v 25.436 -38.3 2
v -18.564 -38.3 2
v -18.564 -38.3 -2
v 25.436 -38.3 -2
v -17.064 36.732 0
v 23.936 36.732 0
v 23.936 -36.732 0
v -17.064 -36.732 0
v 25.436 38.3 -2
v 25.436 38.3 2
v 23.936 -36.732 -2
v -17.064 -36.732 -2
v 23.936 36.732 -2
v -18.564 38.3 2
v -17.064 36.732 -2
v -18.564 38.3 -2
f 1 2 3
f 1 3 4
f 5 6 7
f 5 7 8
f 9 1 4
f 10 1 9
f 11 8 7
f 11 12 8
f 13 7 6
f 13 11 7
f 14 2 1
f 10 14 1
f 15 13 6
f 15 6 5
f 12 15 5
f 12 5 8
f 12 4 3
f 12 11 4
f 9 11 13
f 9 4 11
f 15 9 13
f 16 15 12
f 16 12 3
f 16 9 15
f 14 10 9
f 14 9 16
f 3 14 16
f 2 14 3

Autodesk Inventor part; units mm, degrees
ref_plane "YZ Plane" through (0, 0, 0) normal (1, 0, 0) x (0, 1, 0)
ref_plane "XZ Plane" through (0, 0, 0) normal (0, 1, 0) x (-1, 0, 0)
ref_plane "XY Plane" through (0, 0, 0) normal (0, 0, 1) x (1, 0, 0)
sketch "Esquisse1" plane through (0, 0, 0) normal (0, 0, 1) x (1, 0, 0)
  line L0 (-1, -22.45) -> (1, -22.45) projected
  line L1 (-1, -21.45) -> (-1, -22.45) projected
  line L2 (-3, -21.45) -> (-1, -21.45) projected
  line L3 (-3, -21.45) -> (-3, -34.3) projected
  line L4 (-3, -34.3) -> (-13.5643, -34.3) projected
  line L5 (-13.5643, -34.3) -> (-13.5643, 34.3) projected
  line L6 (-13.5643, 34.3) -> (-3, 34.3) projected
  line L7 (-3, 21.45) -> (-3, 34.3) projected
  line L8 (-1, 21.45) -> (-3, 21.45) projected
  line L9 (-1, 22.45) -> (-1, 21.45) projected
  line L10 (1, 22.45) -> (-1, 22.45) projected
  line L11 (1, 21.45) -> (1, 22.45) projected
  line L12 (3, 21.45) -> (1, 21.45) projected
  line L13 (3, 24.45) -> (3, 21.45) projected
  line L14 (3, 24.45) -> (3.0074, 24.45) projected
  line L15 (3.0074, 24.45) -> (3.0074, 34.3) projected
  line L16 (3.0074, 34.3) -> (15.5357, 34.3) projected
  line L17 (15.5357, 34.3) -> (15.5357, 30.7219) projected
  line L18 (15.5357, 30.7219) -> (17.5357, 30.7219) projected
  line L19 (17.5357, 30.7219) -> (17.5357, 34.3) projected
  line L20 (17.5357, 34.3) -> (21.4357, 34.3) projected
  line L21 (21.4357, 34.3) -> (21.4357, 30.7219) projected
  line L22 (21.4357, 30.7219) -> (23.4357, 30.7219) projected
  line L23 (23.4357, 30.7219) -> (23.4357, 36.3) projected
  line L24 (-16.5643, 36.3) -> (23.4357, 36.3) projected
  line L25 (-16.5643, 36.3) -> (-16.5643, -36.3) projected
  line L26 (-16.5643, -36.3) -> (23.4357, -36.3) projected
  line L27 (23.4357, -30.7219) -> (23.4357, -36.3) projected
  line L28 (23.4357, -30.7219) -> (21.4357, -30.7219) projected
  line L29 (21.4357, -30.7219) -> (21.4357, -34.3) projected
  line L30 (21.4357, -34.3) -> (17.5357, -34.3) projected
  line L31 (17.5357, -34.3) -> (17.5357, -30.7219) projected
  line L32 (17.5357, -30.7219) -> (15.5357, -30.7219) projected
  line L33 (15.5357, -30.7219) -> (15.5357, -34.3) projected
  line L34 (15.5357, -34.3) -> (3.0074, -34.3) projected
  line L35 (3.0074, -34.3) -> (3.0074, -24.45) projected
  line L36 (3.0074, -24.45) -> (3, -24.45) projected
  line L37 (3, -21.45) -> (3, -24.45) projected
  line L38 (1, -21.45) -> (3, -21.45) projected
  line L39 (1, -22.45) -> (1, -21.45) projected
  line L40 (23.4357, 36.3) -> (-16.5643, 36.3)
  line L41 (-16.5643, 36.3) -> (-16.5643, -36.3)
  line L42 (-16.5643, -36.3) -> (23.4357, -36.3)
  line L43 (23.4357, -36.3) -> (23.4357, 36.3)
  line L44 (-18.5643, 38.3) -> (25.4357, 38.3)
  line L45 (25.4357, 38.3) -> (25.4357, -38.3)
  line L46 (25.4357, -38.3) -> (-18.5643, -38.3)
  line L47 (-18.5643, -38.3) -> (-18.5643, 38.3)
  point P0 (0, 0)
  dimension "d0" = 2
extrude "Extrusion1" add sketch "Esquisse1" along normal blind 2 contours L1 L2 L3 L4 L5 L6 L7 L8 L9 L10 L11 L12 L13 L14 L15 L16 L17 L18 L19 L20 L21 L22 L43 L28 L29 L30 L31 L32 L33 L34 L35 L36 L37 L38 L39 L0 | L0 L39 L38 L37 L36 L35 L34 L33 L32 L31 L30 L29 L28 L27 L26 L25 L24 L23 L22 L21 L20 L19 L18 L17 L16 L15 L14 L13 L12 L11 L10 L9 L8 L7 L6 L5 L4 L3 L2 L1 | L44 L45 L46 L47
sketch "Esquisse2" plane through (0, 0, 0) normal (0, 0, -1) x (-1, 0, 0)
  line L0 (-23.4357, -36.3) -> (-23.4357, 36.3) projected
  line L1 (16.5643, 36.3) -> (-23.4357, 36.3) projected
  line L2 (16.5643, 36.3) -> (16.5643, -36.3) projected
  line L3 (16.5643, -36.3) -> (-23.4357, -36.3) projected
  line L4 (18.5643, -38.3) -> (-25.4357, -38.3) projected
  line L5 (18.5643, 38.3) -> (18.5643, -38.3) projected
  line L6 (-25.4357, 38.3) -> (18.5643, 38.3) projected
  line L7 (-25.4357, -38.3) -> (-25.4357, 38.3) projected
  point P0 (0, 0)
extrude "Extrusion2" add sketch "Esquisse2" along normal blind 2
sketch "Esquisse3" plane through (0, 0, -2) normal (0, 0, -1) x (-1, 0, 0)
  line L0 (-23.4357, -36.3) -> (16.5643, -36.3) construction
  line L1 (16.5643, 36.3) -> (-23.4357, 36.3) construction
  line L2 (16.5643, -36.3) -> (-23.4357, 36.3) construction
  line L3 (-23.4357, -36.3) -> (16.5643, 36.3) construction
  line L4 (-23.9357, 36.7319) -> (17.0643, 36.7319)
  line L5 (17.0643, 36.7319) -> (17.0643, -36.7319)
  line L6 (17.0643, -36.7319) -> (-23.9357, -36.7319)
  line L7 (-23.9357, -36.7319) -> (-23.9357, 36.7319)
  line L8 (-23.9357, 36.7319) -> (17.0643, -36.7319) construction
  line L9 (17.0643, 36.7319) -> (-23.9357, -36.7319) construction
  line L10 (16.5643, 36.3) -> (16.5643, -36.3) projected
  point P0 (0, 0)
  point P1 (-3.4357, 0)
  dimension "d5" = 0.5
extrude "Extrusion3" cut sketch "Esquisse3" against normal blind 2
properties part number "Cache_remote"
